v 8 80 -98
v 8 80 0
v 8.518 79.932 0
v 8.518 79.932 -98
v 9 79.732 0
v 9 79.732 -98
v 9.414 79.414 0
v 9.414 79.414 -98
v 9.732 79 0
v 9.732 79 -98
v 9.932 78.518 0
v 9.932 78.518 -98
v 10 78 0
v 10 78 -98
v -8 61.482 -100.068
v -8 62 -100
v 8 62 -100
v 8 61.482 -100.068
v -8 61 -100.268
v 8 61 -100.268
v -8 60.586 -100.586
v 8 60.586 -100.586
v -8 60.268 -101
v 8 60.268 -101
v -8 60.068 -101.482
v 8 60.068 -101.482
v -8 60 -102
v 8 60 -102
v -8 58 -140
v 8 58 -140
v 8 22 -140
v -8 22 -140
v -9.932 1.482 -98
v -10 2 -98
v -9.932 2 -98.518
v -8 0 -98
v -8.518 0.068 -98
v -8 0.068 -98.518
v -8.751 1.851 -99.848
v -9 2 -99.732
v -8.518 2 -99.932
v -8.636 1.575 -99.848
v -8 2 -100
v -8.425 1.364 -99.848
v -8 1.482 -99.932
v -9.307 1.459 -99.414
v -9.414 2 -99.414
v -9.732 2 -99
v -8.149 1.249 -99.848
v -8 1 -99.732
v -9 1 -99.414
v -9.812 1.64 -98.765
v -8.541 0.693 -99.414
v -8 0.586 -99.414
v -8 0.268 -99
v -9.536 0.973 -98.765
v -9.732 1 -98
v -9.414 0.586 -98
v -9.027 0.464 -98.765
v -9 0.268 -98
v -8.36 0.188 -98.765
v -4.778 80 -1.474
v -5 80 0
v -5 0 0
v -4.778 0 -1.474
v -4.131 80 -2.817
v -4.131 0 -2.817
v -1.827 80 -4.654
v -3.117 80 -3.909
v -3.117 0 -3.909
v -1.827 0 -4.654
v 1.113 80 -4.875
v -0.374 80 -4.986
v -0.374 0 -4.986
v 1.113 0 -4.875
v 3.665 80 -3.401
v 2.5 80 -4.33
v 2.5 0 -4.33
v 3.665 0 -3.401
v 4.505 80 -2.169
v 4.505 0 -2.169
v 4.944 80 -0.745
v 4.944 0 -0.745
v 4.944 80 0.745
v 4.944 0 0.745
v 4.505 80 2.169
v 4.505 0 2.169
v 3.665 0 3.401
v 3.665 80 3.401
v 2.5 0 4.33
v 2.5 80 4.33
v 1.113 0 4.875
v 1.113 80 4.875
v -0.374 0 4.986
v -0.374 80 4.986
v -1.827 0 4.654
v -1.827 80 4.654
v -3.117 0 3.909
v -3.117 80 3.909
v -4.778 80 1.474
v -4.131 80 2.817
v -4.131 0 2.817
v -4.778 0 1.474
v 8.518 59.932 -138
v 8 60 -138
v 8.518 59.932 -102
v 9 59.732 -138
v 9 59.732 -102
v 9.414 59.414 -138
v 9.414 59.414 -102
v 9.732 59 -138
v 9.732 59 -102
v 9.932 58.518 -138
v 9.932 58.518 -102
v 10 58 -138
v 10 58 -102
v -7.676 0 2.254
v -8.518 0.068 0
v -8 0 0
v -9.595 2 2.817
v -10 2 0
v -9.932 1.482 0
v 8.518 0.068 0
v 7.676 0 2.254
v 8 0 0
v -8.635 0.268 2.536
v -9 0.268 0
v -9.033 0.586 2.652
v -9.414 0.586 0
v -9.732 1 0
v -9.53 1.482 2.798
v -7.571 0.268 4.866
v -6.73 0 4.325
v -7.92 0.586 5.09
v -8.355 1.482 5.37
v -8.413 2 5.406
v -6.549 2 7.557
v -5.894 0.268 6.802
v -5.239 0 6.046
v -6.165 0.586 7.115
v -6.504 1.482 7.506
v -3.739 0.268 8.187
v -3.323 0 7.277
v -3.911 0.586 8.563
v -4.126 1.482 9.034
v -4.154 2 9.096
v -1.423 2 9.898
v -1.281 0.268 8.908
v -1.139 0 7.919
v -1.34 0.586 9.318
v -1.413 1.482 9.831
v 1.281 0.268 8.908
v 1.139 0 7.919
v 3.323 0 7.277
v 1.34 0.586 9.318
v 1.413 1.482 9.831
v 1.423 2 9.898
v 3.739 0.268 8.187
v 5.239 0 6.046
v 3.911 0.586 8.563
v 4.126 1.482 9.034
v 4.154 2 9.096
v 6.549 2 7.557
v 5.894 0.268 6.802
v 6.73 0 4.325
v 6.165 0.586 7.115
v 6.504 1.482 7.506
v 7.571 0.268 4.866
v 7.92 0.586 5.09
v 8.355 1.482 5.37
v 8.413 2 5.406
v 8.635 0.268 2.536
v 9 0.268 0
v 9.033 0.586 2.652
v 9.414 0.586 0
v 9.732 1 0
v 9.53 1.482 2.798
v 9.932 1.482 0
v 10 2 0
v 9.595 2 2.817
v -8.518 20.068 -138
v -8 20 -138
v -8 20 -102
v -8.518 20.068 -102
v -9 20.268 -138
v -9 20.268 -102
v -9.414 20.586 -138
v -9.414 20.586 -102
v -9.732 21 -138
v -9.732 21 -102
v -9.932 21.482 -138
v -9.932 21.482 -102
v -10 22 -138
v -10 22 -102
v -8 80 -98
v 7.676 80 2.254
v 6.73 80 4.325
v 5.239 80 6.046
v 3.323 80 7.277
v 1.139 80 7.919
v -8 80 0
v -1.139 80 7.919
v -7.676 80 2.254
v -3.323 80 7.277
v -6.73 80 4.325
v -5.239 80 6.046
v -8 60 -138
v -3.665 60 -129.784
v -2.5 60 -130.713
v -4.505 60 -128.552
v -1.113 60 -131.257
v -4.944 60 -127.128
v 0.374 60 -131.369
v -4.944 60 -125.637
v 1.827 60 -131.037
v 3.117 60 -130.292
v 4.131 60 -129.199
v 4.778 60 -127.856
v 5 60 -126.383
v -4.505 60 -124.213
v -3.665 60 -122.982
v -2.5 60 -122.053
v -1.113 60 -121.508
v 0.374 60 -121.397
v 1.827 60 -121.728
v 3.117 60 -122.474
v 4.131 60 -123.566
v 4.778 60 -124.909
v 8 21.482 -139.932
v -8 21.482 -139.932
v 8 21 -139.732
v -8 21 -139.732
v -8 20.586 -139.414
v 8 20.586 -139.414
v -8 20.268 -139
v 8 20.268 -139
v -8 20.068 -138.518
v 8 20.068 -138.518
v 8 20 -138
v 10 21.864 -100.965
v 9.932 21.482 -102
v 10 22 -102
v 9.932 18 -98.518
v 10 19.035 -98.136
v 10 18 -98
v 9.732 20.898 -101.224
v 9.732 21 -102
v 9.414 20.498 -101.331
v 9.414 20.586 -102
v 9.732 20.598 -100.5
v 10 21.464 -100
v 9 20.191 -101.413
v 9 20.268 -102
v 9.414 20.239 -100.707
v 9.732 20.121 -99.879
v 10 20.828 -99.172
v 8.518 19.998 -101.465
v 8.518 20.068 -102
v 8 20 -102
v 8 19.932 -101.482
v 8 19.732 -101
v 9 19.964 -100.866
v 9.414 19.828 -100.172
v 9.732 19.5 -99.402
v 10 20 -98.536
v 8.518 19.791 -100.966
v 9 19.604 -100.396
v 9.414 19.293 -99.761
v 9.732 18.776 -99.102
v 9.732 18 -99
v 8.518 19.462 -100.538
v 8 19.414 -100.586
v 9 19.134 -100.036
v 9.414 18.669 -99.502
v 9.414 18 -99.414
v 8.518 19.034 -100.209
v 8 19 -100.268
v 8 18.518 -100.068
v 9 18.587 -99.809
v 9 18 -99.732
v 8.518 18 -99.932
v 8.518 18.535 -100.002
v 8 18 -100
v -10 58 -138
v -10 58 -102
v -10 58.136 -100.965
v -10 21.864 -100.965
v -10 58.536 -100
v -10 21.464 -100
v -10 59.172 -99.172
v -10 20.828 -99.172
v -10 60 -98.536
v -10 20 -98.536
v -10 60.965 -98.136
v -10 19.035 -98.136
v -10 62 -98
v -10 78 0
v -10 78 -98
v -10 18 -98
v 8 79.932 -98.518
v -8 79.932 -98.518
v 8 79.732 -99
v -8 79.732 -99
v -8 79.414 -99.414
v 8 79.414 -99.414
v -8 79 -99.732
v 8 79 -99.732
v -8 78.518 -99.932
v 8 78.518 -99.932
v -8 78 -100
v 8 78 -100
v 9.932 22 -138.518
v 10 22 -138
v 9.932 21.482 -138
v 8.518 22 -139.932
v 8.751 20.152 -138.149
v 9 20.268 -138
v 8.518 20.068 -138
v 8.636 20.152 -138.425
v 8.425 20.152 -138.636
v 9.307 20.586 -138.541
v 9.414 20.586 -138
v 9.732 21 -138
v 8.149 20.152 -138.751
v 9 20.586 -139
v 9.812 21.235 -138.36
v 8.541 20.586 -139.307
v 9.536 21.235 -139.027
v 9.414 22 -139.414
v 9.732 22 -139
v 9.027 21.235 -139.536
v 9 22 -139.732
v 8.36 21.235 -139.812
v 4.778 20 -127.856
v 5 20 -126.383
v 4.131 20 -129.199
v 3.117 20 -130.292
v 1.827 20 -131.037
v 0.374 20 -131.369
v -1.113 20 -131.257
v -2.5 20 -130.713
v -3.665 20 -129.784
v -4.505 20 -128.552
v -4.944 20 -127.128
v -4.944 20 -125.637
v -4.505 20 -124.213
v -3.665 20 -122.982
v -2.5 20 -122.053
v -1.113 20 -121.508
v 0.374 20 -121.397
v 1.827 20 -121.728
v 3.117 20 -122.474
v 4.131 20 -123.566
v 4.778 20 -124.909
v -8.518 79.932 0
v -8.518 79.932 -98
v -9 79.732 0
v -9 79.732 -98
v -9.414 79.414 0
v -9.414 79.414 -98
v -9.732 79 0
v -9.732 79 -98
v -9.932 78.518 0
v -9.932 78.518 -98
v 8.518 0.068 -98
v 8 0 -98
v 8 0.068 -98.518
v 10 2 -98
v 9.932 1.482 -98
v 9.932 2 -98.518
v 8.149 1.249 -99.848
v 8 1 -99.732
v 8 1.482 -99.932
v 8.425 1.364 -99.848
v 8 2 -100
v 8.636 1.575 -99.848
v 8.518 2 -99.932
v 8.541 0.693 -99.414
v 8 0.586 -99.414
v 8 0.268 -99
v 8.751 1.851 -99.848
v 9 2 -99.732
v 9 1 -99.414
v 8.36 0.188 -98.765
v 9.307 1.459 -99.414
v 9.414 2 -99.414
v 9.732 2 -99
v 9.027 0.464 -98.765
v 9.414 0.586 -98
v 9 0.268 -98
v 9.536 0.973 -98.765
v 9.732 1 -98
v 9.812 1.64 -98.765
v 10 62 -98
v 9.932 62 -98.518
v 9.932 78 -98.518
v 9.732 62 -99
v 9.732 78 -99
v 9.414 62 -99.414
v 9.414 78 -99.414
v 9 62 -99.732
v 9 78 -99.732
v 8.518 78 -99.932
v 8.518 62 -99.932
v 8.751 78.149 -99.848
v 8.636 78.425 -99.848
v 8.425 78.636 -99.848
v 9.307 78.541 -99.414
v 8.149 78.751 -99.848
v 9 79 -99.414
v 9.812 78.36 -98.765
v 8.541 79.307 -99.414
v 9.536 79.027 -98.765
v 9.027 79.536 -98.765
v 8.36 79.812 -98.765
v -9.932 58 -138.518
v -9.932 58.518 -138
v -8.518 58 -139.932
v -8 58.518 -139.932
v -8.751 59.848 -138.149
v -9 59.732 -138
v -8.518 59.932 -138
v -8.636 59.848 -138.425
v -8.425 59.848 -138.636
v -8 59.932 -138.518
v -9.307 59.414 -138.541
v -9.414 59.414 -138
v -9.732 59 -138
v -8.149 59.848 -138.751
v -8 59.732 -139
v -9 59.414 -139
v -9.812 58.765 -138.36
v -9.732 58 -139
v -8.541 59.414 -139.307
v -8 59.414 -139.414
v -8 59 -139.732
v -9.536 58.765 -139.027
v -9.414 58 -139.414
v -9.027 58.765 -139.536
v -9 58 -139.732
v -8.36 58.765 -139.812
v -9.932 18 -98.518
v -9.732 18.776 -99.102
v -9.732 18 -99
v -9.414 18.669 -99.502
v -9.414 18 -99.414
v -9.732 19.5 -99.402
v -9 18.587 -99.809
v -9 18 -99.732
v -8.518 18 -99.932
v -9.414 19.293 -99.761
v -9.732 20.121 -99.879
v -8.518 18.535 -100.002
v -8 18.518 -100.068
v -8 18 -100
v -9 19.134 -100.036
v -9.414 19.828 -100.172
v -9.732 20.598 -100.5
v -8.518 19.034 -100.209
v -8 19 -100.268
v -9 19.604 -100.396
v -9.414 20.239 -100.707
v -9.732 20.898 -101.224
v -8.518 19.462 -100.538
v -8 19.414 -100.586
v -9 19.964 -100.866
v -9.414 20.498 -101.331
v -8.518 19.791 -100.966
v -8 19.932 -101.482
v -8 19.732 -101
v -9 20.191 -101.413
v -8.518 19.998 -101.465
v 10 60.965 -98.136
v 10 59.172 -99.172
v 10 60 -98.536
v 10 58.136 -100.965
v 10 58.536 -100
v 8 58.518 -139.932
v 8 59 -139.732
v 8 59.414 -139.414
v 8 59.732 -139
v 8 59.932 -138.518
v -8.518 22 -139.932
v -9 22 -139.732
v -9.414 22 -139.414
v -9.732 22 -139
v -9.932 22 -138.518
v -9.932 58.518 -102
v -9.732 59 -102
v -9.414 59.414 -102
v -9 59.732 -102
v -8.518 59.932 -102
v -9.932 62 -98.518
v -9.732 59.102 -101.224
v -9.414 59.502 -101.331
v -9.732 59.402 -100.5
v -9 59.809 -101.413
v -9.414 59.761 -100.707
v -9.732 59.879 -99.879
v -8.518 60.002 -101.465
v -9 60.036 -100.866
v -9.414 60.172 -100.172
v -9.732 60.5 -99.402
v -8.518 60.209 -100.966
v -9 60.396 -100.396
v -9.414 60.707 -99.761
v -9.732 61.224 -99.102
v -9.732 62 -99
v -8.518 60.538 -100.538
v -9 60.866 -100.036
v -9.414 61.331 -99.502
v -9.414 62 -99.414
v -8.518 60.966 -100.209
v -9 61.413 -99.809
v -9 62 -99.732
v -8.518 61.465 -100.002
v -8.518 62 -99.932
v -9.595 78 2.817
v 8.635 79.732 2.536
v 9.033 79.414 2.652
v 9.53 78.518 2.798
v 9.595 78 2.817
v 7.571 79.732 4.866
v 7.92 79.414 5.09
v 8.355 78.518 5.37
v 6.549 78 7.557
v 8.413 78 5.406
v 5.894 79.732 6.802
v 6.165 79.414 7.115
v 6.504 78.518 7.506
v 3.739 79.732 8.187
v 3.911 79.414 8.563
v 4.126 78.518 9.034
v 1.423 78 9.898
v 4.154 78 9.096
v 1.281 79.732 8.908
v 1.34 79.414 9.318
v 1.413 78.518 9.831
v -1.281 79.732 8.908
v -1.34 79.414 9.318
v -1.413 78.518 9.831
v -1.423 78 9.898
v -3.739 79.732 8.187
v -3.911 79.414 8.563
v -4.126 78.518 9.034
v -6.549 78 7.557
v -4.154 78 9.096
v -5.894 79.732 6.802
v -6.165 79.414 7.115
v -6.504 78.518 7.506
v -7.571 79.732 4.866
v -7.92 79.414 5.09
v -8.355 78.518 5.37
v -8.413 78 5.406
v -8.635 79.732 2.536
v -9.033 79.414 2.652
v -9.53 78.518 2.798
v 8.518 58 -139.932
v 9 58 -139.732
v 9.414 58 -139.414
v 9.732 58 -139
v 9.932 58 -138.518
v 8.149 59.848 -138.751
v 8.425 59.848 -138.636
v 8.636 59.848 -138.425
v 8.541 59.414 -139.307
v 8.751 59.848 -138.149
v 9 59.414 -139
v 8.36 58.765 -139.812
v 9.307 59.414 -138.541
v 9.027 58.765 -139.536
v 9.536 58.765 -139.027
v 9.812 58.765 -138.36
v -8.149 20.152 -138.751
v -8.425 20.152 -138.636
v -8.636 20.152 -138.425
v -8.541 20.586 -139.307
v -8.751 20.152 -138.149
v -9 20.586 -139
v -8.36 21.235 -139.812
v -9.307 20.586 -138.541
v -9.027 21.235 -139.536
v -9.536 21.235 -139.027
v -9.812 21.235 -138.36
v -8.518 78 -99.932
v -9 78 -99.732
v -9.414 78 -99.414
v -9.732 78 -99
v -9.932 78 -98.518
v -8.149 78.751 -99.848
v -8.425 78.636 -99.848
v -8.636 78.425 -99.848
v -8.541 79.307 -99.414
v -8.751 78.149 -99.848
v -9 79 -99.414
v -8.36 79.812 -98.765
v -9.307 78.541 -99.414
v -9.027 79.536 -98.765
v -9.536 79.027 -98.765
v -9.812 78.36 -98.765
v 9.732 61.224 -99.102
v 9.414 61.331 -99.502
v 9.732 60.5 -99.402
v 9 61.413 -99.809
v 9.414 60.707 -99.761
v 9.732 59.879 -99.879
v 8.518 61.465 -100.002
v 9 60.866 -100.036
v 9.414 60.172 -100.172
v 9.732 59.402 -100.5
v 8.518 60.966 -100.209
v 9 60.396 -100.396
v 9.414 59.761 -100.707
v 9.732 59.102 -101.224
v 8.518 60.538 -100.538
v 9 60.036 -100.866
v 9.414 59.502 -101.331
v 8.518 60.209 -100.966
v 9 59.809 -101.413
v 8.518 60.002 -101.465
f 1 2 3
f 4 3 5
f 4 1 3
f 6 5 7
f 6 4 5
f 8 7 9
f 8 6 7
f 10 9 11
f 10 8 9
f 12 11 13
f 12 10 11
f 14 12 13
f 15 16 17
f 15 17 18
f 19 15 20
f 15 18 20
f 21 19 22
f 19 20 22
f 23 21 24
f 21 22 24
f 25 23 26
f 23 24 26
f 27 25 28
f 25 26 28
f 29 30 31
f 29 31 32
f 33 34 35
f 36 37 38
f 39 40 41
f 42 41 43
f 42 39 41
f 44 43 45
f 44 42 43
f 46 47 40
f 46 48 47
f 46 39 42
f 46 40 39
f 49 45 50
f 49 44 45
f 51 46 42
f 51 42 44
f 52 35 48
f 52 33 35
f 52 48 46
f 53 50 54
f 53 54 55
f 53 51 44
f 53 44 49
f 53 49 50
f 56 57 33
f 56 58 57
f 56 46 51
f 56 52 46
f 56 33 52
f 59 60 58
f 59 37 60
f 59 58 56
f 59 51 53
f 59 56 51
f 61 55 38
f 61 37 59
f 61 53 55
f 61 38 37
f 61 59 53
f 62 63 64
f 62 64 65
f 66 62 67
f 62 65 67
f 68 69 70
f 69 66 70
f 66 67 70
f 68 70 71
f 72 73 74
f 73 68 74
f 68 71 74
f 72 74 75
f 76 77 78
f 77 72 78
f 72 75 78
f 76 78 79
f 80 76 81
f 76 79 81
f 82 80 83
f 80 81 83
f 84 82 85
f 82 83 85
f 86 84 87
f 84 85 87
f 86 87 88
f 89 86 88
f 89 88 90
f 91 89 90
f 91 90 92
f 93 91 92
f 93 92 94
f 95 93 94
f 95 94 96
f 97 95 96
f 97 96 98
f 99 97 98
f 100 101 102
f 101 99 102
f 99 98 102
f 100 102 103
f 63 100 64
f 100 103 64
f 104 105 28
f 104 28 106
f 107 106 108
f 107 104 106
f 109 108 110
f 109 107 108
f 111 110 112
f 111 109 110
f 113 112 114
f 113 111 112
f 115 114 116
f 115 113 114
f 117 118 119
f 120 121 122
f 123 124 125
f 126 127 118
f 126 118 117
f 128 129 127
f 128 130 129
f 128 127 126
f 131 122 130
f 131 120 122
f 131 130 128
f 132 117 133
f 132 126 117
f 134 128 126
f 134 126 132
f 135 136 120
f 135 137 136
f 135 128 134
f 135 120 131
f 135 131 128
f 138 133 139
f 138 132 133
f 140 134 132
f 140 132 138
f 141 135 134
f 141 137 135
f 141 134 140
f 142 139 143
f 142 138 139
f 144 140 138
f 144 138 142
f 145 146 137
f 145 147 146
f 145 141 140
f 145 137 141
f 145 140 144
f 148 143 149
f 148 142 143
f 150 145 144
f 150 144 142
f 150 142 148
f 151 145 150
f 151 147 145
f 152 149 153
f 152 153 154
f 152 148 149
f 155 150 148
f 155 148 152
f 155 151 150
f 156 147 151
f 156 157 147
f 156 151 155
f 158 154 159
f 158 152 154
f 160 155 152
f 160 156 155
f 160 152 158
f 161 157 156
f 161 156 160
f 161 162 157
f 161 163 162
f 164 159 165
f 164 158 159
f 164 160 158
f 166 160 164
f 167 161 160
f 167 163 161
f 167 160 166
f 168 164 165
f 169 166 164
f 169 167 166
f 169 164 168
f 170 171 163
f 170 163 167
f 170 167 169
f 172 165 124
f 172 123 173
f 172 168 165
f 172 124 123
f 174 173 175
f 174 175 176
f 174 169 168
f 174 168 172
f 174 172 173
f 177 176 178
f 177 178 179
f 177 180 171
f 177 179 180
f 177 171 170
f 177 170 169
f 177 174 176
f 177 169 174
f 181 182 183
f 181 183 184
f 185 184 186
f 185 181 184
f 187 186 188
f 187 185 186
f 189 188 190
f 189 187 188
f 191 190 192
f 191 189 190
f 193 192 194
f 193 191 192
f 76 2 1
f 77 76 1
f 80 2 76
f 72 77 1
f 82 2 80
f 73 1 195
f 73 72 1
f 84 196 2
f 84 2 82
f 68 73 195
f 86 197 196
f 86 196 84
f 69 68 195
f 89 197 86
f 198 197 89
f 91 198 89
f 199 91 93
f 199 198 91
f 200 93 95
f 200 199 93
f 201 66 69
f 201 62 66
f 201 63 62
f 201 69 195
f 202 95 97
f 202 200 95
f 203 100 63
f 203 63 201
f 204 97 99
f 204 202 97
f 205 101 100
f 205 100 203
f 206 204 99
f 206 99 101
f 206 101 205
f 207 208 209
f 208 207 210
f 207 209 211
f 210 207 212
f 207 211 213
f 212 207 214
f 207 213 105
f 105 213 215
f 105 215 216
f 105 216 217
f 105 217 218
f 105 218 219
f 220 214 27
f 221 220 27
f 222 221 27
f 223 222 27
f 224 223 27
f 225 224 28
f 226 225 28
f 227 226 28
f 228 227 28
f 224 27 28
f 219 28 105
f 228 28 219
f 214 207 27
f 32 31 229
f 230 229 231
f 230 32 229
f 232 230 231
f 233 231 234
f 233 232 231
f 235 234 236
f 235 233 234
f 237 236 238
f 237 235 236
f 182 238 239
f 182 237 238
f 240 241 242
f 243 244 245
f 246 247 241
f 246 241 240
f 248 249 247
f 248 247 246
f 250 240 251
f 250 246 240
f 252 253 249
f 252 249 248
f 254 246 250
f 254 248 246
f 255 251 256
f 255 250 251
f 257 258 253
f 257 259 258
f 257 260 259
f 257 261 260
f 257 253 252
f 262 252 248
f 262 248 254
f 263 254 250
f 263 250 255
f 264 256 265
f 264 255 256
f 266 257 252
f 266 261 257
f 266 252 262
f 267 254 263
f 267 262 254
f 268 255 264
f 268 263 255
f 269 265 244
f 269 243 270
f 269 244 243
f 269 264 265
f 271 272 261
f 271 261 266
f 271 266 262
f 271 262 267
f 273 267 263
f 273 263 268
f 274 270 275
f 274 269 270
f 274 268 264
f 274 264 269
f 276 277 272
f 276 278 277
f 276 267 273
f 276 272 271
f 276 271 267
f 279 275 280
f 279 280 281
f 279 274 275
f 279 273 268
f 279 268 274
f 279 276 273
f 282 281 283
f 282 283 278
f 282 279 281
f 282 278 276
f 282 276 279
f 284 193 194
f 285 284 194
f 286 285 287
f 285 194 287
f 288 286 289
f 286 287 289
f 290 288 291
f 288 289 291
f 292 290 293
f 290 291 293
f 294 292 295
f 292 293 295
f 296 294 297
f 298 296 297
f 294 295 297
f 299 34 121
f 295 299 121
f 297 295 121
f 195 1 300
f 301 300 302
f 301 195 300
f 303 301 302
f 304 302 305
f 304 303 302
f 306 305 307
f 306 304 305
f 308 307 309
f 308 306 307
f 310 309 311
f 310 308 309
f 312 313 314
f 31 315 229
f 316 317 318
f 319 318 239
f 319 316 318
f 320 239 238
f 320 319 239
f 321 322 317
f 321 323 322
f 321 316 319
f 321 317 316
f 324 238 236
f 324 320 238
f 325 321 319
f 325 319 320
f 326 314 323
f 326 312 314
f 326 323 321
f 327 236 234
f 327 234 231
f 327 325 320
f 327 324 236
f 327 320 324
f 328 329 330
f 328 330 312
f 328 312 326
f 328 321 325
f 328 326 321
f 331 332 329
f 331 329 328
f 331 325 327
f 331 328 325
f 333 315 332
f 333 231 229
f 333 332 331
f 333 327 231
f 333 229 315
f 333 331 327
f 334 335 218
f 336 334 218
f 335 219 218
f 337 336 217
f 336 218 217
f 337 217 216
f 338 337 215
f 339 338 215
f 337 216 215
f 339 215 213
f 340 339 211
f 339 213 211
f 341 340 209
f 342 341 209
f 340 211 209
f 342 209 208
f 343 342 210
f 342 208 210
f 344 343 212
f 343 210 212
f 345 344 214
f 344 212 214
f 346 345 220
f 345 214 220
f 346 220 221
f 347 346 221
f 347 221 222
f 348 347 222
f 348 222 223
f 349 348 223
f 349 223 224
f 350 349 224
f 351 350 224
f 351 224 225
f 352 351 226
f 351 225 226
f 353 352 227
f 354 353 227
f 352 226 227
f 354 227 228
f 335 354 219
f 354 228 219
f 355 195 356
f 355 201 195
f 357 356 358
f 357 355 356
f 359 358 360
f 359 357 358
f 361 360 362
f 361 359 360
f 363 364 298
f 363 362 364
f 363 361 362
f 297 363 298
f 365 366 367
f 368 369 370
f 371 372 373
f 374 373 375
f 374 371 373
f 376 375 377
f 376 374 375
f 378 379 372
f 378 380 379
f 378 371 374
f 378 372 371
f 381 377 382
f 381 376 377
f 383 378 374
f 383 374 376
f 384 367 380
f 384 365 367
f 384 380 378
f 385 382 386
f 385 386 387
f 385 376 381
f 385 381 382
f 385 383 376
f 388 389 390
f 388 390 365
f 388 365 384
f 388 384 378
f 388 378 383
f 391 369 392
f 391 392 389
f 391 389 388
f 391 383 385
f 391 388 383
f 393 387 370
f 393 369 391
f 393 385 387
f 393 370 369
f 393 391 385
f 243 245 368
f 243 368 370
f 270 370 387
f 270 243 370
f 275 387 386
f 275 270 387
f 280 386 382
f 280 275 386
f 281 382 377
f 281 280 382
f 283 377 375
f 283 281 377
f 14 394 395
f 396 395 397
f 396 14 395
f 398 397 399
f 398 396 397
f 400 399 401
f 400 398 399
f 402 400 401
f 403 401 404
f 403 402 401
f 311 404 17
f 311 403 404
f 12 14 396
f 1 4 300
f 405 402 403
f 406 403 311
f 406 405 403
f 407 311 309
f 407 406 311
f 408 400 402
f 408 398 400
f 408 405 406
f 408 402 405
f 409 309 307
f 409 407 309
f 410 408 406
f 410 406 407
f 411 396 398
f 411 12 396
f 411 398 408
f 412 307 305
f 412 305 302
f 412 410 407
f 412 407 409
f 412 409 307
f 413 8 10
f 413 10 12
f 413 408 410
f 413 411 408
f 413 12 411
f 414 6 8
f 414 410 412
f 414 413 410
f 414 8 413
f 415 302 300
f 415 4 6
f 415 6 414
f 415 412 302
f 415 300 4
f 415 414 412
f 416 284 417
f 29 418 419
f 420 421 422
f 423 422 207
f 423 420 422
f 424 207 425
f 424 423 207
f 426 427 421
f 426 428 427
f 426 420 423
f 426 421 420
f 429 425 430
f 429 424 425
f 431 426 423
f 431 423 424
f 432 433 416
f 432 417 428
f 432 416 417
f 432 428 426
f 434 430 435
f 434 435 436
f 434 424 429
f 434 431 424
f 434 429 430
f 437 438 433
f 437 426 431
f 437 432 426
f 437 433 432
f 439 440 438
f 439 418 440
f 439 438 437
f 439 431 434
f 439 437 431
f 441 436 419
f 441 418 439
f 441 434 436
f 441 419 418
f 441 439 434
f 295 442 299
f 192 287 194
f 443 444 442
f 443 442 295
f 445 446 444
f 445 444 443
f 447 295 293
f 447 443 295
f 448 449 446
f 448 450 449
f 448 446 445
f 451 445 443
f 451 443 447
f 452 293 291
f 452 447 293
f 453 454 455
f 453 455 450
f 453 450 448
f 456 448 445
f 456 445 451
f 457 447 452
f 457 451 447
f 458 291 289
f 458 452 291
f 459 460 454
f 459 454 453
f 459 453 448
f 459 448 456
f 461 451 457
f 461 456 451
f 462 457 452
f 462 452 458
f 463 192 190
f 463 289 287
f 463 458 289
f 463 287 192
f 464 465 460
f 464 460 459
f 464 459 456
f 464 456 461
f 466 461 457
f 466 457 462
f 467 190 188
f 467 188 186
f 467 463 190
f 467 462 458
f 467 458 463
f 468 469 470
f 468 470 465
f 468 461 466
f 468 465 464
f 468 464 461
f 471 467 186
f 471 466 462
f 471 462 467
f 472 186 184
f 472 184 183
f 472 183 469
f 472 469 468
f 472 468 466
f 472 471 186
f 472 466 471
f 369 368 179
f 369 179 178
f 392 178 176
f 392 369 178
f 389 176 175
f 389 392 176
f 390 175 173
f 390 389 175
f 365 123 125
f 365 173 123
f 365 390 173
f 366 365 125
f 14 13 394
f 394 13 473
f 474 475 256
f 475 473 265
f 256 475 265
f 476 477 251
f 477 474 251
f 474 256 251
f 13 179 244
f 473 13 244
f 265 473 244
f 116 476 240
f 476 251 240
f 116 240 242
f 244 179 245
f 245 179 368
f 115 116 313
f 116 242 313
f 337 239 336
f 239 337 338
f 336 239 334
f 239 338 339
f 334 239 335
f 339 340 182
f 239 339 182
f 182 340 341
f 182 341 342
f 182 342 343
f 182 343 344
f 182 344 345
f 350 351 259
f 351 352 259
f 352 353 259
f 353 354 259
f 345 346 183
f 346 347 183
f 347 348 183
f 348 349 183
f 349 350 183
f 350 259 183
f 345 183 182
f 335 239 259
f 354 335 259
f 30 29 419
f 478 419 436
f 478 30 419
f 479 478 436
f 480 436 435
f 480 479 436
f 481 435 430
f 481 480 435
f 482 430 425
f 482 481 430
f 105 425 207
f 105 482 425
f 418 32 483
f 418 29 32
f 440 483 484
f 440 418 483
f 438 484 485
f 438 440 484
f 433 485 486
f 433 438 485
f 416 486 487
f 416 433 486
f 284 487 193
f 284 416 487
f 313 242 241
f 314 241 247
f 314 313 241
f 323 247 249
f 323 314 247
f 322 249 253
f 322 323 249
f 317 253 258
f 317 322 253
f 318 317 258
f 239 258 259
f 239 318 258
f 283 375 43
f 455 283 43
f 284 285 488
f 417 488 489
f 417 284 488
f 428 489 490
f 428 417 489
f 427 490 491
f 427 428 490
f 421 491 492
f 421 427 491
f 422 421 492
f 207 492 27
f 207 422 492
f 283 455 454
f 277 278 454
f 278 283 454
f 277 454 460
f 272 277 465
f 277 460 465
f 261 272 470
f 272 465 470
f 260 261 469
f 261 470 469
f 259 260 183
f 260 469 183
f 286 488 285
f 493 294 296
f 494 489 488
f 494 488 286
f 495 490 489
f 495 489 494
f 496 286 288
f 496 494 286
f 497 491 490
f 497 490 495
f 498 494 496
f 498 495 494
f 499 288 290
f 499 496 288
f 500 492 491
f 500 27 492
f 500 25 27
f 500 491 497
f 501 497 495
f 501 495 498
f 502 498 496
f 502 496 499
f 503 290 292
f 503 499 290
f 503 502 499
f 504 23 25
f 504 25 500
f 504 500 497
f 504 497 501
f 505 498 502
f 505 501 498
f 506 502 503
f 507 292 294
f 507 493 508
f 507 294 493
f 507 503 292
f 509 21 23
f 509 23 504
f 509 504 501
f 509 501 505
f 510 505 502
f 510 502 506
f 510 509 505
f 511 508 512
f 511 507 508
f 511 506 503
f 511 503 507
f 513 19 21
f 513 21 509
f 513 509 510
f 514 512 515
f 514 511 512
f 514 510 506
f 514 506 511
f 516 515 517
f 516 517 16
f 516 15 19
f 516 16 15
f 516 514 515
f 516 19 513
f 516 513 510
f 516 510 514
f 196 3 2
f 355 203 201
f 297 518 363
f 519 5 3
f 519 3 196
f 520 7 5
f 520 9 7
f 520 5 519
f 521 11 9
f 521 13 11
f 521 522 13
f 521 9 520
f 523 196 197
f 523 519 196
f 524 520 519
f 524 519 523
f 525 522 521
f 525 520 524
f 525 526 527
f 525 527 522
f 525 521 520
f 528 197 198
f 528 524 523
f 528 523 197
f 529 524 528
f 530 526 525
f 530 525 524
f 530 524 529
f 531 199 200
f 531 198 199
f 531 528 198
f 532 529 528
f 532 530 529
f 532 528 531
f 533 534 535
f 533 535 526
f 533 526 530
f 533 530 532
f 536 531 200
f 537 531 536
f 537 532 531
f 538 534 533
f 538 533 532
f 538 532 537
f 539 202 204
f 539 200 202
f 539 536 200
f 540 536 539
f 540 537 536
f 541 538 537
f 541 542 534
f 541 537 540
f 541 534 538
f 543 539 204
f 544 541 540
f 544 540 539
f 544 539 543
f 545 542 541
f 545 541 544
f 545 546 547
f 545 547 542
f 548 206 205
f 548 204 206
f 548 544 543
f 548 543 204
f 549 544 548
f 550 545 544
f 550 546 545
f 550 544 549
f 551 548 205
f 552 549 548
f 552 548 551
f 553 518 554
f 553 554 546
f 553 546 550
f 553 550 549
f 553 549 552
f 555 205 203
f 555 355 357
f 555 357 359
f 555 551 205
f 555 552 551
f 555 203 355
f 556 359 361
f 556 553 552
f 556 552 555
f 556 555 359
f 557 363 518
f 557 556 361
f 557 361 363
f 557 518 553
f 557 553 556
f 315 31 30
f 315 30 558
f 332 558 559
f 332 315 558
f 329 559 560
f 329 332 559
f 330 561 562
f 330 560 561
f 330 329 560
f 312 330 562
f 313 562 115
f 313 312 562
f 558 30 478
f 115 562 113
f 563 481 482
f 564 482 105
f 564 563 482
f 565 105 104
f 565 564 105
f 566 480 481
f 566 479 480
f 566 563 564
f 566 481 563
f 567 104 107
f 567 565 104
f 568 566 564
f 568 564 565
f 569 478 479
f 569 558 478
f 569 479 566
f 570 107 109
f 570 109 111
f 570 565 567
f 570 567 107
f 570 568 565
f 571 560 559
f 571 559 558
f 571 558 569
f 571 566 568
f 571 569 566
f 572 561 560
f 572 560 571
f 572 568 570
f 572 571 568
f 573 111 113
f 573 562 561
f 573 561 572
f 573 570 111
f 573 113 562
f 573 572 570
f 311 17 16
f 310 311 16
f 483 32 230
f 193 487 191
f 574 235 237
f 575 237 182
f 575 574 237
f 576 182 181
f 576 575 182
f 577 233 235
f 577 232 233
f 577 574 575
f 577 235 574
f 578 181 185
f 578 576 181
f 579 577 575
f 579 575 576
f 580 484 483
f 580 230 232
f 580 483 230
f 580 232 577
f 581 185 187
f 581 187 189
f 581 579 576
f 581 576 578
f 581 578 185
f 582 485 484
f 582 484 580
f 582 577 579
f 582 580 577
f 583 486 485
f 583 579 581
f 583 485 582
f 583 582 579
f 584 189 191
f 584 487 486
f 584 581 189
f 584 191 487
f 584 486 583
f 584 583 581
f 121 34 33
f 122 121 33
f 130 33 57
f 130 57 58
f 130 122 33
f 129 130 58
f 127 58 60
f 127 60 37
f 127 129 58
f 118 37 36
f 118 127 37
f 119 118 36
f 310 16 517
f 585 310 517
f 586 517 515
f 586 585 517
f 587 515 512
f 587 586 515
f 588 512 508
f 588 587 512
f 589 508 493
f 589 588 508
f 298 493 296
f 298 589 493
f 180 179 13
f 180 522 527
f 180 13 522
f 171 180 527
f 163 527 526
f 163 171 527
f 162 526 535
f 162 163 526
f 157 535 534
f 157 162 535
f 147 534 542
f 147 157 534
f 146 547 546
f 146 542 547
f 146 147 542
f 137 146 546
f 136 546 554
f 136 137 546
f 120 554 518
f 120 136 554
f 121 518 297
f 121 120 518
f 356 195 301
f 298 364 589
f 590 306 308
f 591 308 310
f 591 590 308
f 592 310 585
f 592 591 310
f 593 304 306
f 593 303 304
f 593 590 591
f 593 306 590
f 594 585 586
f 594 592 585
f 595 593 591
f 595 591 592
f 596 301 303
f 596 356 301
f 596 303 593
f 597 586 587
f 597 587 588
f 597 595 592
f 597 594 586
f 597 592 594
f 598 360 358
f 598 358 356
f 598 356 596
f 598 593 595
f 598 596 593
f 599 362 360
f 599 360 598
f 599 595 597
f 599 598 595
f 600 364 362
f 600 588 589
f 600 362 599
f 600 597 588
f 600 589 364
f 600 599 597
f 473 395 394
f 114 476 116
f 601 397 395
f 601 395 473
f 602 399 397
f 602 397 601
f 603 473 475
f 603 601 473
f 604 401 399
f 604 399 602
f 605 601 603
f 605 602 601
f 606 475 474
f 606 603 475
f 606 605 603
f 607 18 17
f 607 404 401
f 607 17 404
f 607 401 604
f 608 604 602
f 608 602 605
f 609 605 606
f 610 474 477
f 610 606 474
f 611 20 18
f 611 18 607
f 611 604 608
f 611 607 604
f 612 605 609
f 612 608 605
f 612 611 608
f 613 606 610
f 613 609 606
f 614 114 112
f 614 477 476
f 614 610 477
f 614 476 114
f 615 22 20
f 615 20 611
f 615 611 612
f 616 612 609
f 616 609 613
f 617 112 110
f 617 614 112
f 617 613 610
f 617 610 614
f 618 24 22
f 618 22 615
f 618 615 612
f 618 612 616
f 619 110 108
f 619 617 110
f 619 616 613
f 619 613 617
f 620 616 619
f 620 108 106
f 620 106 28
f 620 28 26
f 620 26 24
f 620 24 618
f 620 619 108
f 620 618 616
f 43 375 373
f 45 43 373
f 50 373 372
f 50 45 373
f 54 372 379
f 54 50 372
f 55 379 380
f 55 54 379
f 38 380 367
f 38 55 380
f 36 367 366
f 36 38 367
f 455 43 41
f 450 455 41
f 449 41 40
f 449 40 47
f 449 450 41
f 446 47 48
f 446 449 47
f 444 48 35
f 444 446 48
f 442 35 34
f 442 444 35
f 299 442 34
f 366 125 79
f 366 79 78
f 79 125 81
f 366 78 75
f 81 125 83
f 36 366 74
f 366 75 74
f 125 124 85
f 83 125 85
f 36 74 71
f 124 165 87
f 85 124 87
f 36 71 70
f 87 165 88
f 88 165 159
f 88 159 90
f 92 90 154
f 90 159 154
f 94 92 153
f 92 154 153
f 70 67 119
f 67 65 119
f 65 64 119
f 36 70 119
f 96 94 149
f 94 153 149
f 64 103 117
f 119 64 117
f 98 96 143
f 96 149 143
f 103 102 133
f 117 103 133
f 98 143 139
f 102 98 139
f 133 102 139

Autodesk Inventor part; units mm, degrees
ref_plane "YZ Plane" through (0, 0, 0) normal (1, 0, 0) x (0, 1, 0)
ref_plane "XZ Plane" through (0, 0, 0) normal (0, 1, 0) x (-1, 0, 0)
ref_plane "XY Plane" through (0, 0, 0) normal (0, 0, 1) x (1, 0, 0)
sketch "Sketch1" plane through (0, 0, 0) normal (0, 1, 0) x (-1, 0, 0)
  arc A0 (10, 0) -> (-10, 0) centre (0, 0) ccw
  circle A1 centre (0, 0) radius 5
  line L0 (-10, 0) -> (-10, -100)
  line L1 (-10, -100) -> (10, -100)
  line L2 (10, -100) -> (10, 0)
  dimension "d1" = 10
  dimension "d2" = 100
  dimension "d12" = 20
extrude "Extrusion1" add sketch "Sketch1" along normal blind 80
sketch "Sketch2" plane through (10, 0, -100) normal (0, 0, -1) x (-1, 0, 0)
  line L0 (20, 0) -> (20, 80) projected
  line L1 (0, 20) -> (20, 20)
  line L2 (20, 20) -> (20, 60)
  line L3 (20, 60) -> (0, 60)
  line L4 (0, 60) -> (0, 20)
  line L5 (0, 20) -> (20, 60) construction
  line L6 (20, 20) -> (0, 60) construction
  point P0 (10, 0)
  point P1 (10, 40)
  dimension "d5" = 40
extrude "Extrusion2" add sketch "Sketch2" along normal blind 40
sketch "Sketch3" plane through (-10, 60, -100) normal (0, 1, 0) x (1, 0, 0)
  circle A0 centre (10, 26.3827) radius 5
  point P0 (10, -100)
  dimension "d8" = 10
extrude "Extrusion3" cut sketch "Sketch3" against normal blind 40
fillet "Fillet1" radius 2 22 edges at (0, 80, 10) (10, 80, -50) (-10, 80, -50) (10, 0, -50) (-10, 0, -50) (0, 0, 10) (-10, 70, -100) (0, 80, -100) (10, 70, -100) (-10, 10, -100) (10, 10, -100) (0, 0, -100) (0, 60, -100) (0, 20, -100) (10, 40, -140) (-10, 40, -140) (0, 20, -140) (10, 20, -120) (-10, 20, -120) (10, 60, -120) (-10, 60, -120) (0, 60, -140)
properties part number "Link1"
